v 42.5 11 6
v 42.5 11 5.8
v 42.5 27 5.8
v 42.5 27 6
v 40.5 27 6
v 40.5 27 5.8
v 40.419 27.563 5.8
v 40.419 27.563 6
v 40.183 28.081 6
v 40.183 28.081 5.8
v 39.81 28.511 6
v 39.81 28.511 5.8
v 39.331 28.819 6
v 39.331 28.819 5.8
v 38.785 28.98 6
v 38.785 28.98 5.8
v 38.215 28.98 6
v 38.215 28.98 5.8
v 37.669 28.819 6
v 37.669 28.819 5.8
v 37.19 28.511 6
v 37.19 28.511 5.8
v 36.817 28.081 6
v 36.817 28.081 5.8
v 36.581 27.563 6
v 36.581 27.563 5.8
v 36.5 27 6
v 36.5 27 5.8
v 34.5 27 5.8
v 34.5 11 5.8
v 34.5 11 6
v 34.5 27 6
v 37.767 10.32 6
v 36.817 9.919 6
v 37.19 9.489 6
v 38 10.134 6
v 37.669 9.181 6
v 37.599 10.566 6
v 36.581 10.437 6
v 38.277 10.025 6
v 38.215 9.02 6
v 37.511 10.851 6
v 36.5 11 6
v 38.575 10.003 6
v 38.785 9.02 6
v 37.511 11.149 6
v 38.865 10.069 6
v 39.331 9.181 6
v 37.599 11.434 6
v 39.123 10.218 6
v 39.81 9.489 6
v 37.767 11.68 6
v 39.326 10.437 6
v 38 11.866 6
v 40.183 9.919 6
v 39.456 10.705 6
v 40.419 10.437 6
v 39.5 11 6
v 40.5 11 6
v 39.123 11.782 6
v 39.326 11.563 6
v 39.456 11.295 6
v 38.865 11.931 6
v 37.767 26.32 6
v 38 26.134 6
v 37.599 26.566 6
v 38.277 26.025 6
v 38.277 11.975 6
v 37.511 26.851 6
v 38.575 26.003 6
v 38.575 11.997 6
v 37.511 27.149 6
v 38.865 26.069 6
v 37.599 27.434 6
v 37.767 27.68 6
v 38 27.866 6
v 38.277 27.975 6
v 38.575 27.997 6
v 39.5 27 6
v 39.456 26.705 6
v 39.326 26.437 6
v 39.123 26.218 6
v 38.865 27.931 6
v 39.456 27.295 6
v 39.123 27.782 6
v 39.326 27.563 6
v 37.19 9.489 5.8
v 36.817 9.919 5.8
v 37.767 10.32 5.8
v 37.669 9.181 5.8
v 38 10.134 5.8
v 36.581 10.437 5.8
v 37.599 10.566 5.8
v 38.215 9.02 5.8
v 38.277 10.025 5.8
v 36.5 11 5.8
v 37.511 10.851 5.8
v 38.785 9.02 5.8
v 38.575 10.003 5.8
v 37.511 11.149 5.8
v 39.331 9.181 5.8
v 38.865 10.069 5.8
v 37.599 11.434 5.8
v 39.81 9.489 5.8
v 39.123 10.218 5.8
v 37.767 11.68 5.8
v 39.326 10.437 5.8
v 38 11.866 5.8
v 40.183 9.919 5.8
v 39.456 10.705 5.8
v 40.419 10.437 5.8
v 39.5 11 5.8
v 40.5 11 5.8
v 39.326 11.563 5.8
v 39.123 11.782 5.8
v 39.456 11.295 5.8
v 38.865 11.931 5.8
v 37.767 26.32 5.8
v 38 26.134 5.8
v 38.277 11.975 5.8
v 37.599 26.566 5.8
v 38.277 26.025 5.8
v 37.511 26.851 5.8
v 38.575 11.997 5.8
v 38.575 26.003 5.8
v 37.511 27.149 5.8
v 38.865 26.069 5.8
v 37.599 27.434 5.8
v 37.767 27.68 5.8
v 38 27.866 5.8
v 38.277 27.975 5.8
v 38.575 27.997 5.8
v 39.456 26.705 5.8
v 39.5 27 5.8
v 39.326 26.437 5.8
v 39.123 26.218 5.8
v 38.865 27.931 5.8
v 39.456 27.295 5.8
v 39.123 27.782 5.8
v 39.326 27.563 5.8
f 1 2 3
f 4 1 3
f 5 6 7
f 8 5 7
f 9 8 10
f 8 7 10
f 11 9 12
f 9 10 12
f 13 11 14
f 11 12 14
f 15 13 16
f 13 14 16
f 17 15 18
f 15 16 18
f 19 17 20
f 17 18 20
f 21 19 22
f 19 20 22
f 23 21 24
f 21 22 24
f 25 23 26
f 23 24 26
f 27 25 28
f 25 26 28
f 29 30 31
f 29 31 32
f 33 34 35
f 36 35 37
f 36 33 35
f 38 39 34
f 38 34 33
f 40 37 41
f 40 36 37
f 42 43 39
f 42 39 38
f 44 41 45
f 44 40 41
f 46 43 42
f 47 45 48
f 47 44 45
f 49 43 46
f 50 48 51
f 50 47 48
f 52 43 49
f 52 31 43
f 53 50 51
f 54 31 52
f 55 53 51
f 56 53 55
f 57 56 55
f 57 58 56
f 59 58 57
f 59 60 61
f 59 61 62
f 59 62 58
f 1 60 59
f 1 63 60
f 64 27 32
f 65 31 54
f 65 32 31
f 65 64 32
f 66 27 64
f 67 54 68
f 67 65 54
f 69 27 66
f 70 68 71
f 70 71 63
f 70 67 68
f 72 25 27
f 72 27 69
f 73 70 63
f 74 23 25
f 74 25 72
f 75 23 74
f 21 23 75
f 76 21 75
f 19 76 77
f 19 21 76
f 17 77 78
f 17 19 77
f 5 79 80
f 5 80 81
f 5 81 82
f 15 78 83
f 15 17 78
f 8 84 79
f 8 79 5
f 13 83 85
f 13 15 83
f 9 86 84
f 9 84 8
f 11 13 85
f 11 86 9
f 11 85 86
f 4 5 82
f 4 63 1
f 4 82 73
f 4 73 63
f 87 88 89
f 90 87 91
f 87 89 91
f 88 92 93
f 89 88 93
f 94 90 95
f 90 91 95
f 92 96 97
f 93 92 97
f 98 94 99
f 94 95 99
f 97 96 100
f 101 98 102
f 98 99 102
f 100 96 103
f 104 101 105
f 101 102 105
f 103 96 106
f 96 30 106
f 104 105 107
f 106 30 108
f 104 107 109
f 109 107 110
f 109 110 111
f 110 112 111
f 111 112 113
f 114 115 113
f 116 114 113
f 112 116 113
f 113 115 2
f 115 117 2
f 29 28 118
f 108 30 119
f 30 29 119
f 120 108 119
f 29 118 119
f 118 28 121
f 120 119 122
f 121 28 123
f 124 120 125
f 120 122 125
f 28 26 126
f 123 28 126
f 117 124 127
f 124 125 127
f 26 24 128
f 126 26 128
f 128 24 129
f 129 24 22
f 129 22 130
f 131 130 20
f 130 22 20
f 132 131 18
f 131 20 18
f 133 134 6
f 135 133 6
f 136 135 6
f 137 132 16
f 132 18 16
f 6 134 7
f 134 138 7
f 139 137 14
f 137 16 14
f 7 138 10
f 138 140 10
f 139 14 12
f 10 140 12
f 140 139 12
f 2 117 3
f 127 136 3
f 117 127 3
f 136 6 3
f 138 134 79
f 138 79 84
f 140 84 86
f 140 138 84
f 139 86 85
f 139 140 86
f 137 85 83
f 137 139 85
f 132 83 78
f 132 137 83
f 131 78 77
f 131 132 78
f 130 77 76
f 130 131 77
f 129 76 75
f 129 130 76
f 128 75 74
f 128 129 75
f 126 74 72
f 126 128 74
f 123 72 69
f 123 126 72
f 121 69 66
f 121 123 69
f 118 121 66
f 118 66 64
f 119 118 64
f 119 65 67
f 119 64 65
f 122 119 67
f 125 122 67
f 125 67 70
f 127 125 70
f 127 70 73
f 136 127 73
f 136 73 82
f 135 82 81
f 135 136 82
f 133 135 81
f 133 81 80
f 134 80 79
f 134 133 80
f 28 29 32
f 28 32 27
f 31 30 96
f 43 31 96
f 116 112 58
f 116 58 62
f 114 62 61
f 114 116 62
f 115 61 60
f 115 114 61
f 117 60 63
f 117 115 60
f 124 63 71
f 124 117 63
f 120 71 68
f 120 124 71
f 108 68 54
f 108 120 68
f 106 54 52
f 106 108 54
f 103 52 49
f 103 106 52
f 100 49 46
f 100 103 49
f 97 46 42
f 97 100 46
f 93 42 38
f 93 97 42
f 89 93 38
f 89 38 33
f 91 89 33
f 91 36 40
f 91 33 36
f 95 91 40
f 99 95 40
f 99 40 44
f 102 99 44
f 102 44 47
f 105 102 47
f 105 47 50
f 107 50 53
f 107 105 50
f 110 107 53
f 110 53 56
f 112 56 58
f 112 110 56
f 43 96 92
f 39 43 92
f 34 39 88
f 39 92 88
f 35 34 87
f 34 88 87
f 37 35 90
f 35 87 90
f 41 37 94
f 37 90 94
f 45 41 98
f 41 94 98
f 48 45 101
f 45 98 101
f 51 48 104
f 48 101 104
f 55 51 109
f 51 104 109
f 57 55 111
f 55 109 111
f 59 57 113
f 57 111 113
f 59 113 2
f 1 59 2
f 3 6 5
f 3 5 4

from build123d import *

# Parameters (mm, degrees)
CYLINDER005_R     = 1
CYLINDER005_DEPTH = 10
CYLINDER004_R     = 1
CYLINDER004_DEPTH = 10
CYLINDER001_R     = 2
CYLINDER001_DEPTH = 0.2
CYLINDER_R        = 2
CYLINDER_DEPTH    = 0.2
BOX008_W          = 8
BOX008_H          = 16
BOX008_DEPTH      = 0.2


with BuildPart() as cilindro005:
    # Cylinder005 → Cylinder005 (new body)
    with BuildSketch(Plane(origin=(38.5, 11, 1), x_dir=(1, 0, 0), z_dir=(0, 0, 1))):
        Circle(CYLINDER005_R)
    extrude(amount=CYLINDER005_DEPTH)


with BuildPart() as cilindro004:
    # Cylinder004 → Cylinder004 (new body)
    with BuildSketch(Plane(origin=(38.5, 27, 1), x_dir=(1, 0, 0), z_dir=(0, 0, 1))):
        Circle(CYLINDER004_R)
    extrude(amount=CYLINDER004_DEPTH)


with BuildPart() as cilindro001:
    # Cylinder001 → Cylinder001 (new body)
    with BuildSketch(Plane(origin=(39, 26.5, 1), x_dir=(1, 0, 0), z_dir=(0, 0, 1))):
        Circle(CYLINDER001_R)
    extrude(amount=CYLINDER001_DEPTH)


with BuildPart() as cilindro:
    # Cylinder → Cylinder (new body)
    with BuildSketch(Plane(origin=(39, 10.5, 1), x_dir=(1, 0, 0), z_dir=(0, 0, 1))):
        Circle(CYLINDER_R)
    extrude(amount=CYLINDER_DEPTH)


with BuildPart() as chapa_flex:
    # Box008 → Box008 (new body)
    with BuildSketch(Plane(origin=(35, 10.5, 1), x_dir=(1, 0, 0), z_dir=(0, 0, 1))):
        with Locations((4, 8)):
            Rectangle(BOX008_W, BOX008_H)
    extrude(amount=BOX008_DEPTH)

    # Fusion: union Cilindro001, Cilindro
    add(cilindro001.part)
    add(cilindro.part)


with BuildPart() as chapa_flex_1:
    # Fusion placement: moved
    add(chapa_flex.part.moved(Location((-0.5, 0.5, 4.8))))

    # Cut005: cut Cilindro004
    add(cilindro004.part, mode=Mode.SUBTRACT)

    # Cut006: cut Cilindro005
    add(cilindro005.part, mode=Mode.SUBTRACT)


solid = chapa_flex_1.part
